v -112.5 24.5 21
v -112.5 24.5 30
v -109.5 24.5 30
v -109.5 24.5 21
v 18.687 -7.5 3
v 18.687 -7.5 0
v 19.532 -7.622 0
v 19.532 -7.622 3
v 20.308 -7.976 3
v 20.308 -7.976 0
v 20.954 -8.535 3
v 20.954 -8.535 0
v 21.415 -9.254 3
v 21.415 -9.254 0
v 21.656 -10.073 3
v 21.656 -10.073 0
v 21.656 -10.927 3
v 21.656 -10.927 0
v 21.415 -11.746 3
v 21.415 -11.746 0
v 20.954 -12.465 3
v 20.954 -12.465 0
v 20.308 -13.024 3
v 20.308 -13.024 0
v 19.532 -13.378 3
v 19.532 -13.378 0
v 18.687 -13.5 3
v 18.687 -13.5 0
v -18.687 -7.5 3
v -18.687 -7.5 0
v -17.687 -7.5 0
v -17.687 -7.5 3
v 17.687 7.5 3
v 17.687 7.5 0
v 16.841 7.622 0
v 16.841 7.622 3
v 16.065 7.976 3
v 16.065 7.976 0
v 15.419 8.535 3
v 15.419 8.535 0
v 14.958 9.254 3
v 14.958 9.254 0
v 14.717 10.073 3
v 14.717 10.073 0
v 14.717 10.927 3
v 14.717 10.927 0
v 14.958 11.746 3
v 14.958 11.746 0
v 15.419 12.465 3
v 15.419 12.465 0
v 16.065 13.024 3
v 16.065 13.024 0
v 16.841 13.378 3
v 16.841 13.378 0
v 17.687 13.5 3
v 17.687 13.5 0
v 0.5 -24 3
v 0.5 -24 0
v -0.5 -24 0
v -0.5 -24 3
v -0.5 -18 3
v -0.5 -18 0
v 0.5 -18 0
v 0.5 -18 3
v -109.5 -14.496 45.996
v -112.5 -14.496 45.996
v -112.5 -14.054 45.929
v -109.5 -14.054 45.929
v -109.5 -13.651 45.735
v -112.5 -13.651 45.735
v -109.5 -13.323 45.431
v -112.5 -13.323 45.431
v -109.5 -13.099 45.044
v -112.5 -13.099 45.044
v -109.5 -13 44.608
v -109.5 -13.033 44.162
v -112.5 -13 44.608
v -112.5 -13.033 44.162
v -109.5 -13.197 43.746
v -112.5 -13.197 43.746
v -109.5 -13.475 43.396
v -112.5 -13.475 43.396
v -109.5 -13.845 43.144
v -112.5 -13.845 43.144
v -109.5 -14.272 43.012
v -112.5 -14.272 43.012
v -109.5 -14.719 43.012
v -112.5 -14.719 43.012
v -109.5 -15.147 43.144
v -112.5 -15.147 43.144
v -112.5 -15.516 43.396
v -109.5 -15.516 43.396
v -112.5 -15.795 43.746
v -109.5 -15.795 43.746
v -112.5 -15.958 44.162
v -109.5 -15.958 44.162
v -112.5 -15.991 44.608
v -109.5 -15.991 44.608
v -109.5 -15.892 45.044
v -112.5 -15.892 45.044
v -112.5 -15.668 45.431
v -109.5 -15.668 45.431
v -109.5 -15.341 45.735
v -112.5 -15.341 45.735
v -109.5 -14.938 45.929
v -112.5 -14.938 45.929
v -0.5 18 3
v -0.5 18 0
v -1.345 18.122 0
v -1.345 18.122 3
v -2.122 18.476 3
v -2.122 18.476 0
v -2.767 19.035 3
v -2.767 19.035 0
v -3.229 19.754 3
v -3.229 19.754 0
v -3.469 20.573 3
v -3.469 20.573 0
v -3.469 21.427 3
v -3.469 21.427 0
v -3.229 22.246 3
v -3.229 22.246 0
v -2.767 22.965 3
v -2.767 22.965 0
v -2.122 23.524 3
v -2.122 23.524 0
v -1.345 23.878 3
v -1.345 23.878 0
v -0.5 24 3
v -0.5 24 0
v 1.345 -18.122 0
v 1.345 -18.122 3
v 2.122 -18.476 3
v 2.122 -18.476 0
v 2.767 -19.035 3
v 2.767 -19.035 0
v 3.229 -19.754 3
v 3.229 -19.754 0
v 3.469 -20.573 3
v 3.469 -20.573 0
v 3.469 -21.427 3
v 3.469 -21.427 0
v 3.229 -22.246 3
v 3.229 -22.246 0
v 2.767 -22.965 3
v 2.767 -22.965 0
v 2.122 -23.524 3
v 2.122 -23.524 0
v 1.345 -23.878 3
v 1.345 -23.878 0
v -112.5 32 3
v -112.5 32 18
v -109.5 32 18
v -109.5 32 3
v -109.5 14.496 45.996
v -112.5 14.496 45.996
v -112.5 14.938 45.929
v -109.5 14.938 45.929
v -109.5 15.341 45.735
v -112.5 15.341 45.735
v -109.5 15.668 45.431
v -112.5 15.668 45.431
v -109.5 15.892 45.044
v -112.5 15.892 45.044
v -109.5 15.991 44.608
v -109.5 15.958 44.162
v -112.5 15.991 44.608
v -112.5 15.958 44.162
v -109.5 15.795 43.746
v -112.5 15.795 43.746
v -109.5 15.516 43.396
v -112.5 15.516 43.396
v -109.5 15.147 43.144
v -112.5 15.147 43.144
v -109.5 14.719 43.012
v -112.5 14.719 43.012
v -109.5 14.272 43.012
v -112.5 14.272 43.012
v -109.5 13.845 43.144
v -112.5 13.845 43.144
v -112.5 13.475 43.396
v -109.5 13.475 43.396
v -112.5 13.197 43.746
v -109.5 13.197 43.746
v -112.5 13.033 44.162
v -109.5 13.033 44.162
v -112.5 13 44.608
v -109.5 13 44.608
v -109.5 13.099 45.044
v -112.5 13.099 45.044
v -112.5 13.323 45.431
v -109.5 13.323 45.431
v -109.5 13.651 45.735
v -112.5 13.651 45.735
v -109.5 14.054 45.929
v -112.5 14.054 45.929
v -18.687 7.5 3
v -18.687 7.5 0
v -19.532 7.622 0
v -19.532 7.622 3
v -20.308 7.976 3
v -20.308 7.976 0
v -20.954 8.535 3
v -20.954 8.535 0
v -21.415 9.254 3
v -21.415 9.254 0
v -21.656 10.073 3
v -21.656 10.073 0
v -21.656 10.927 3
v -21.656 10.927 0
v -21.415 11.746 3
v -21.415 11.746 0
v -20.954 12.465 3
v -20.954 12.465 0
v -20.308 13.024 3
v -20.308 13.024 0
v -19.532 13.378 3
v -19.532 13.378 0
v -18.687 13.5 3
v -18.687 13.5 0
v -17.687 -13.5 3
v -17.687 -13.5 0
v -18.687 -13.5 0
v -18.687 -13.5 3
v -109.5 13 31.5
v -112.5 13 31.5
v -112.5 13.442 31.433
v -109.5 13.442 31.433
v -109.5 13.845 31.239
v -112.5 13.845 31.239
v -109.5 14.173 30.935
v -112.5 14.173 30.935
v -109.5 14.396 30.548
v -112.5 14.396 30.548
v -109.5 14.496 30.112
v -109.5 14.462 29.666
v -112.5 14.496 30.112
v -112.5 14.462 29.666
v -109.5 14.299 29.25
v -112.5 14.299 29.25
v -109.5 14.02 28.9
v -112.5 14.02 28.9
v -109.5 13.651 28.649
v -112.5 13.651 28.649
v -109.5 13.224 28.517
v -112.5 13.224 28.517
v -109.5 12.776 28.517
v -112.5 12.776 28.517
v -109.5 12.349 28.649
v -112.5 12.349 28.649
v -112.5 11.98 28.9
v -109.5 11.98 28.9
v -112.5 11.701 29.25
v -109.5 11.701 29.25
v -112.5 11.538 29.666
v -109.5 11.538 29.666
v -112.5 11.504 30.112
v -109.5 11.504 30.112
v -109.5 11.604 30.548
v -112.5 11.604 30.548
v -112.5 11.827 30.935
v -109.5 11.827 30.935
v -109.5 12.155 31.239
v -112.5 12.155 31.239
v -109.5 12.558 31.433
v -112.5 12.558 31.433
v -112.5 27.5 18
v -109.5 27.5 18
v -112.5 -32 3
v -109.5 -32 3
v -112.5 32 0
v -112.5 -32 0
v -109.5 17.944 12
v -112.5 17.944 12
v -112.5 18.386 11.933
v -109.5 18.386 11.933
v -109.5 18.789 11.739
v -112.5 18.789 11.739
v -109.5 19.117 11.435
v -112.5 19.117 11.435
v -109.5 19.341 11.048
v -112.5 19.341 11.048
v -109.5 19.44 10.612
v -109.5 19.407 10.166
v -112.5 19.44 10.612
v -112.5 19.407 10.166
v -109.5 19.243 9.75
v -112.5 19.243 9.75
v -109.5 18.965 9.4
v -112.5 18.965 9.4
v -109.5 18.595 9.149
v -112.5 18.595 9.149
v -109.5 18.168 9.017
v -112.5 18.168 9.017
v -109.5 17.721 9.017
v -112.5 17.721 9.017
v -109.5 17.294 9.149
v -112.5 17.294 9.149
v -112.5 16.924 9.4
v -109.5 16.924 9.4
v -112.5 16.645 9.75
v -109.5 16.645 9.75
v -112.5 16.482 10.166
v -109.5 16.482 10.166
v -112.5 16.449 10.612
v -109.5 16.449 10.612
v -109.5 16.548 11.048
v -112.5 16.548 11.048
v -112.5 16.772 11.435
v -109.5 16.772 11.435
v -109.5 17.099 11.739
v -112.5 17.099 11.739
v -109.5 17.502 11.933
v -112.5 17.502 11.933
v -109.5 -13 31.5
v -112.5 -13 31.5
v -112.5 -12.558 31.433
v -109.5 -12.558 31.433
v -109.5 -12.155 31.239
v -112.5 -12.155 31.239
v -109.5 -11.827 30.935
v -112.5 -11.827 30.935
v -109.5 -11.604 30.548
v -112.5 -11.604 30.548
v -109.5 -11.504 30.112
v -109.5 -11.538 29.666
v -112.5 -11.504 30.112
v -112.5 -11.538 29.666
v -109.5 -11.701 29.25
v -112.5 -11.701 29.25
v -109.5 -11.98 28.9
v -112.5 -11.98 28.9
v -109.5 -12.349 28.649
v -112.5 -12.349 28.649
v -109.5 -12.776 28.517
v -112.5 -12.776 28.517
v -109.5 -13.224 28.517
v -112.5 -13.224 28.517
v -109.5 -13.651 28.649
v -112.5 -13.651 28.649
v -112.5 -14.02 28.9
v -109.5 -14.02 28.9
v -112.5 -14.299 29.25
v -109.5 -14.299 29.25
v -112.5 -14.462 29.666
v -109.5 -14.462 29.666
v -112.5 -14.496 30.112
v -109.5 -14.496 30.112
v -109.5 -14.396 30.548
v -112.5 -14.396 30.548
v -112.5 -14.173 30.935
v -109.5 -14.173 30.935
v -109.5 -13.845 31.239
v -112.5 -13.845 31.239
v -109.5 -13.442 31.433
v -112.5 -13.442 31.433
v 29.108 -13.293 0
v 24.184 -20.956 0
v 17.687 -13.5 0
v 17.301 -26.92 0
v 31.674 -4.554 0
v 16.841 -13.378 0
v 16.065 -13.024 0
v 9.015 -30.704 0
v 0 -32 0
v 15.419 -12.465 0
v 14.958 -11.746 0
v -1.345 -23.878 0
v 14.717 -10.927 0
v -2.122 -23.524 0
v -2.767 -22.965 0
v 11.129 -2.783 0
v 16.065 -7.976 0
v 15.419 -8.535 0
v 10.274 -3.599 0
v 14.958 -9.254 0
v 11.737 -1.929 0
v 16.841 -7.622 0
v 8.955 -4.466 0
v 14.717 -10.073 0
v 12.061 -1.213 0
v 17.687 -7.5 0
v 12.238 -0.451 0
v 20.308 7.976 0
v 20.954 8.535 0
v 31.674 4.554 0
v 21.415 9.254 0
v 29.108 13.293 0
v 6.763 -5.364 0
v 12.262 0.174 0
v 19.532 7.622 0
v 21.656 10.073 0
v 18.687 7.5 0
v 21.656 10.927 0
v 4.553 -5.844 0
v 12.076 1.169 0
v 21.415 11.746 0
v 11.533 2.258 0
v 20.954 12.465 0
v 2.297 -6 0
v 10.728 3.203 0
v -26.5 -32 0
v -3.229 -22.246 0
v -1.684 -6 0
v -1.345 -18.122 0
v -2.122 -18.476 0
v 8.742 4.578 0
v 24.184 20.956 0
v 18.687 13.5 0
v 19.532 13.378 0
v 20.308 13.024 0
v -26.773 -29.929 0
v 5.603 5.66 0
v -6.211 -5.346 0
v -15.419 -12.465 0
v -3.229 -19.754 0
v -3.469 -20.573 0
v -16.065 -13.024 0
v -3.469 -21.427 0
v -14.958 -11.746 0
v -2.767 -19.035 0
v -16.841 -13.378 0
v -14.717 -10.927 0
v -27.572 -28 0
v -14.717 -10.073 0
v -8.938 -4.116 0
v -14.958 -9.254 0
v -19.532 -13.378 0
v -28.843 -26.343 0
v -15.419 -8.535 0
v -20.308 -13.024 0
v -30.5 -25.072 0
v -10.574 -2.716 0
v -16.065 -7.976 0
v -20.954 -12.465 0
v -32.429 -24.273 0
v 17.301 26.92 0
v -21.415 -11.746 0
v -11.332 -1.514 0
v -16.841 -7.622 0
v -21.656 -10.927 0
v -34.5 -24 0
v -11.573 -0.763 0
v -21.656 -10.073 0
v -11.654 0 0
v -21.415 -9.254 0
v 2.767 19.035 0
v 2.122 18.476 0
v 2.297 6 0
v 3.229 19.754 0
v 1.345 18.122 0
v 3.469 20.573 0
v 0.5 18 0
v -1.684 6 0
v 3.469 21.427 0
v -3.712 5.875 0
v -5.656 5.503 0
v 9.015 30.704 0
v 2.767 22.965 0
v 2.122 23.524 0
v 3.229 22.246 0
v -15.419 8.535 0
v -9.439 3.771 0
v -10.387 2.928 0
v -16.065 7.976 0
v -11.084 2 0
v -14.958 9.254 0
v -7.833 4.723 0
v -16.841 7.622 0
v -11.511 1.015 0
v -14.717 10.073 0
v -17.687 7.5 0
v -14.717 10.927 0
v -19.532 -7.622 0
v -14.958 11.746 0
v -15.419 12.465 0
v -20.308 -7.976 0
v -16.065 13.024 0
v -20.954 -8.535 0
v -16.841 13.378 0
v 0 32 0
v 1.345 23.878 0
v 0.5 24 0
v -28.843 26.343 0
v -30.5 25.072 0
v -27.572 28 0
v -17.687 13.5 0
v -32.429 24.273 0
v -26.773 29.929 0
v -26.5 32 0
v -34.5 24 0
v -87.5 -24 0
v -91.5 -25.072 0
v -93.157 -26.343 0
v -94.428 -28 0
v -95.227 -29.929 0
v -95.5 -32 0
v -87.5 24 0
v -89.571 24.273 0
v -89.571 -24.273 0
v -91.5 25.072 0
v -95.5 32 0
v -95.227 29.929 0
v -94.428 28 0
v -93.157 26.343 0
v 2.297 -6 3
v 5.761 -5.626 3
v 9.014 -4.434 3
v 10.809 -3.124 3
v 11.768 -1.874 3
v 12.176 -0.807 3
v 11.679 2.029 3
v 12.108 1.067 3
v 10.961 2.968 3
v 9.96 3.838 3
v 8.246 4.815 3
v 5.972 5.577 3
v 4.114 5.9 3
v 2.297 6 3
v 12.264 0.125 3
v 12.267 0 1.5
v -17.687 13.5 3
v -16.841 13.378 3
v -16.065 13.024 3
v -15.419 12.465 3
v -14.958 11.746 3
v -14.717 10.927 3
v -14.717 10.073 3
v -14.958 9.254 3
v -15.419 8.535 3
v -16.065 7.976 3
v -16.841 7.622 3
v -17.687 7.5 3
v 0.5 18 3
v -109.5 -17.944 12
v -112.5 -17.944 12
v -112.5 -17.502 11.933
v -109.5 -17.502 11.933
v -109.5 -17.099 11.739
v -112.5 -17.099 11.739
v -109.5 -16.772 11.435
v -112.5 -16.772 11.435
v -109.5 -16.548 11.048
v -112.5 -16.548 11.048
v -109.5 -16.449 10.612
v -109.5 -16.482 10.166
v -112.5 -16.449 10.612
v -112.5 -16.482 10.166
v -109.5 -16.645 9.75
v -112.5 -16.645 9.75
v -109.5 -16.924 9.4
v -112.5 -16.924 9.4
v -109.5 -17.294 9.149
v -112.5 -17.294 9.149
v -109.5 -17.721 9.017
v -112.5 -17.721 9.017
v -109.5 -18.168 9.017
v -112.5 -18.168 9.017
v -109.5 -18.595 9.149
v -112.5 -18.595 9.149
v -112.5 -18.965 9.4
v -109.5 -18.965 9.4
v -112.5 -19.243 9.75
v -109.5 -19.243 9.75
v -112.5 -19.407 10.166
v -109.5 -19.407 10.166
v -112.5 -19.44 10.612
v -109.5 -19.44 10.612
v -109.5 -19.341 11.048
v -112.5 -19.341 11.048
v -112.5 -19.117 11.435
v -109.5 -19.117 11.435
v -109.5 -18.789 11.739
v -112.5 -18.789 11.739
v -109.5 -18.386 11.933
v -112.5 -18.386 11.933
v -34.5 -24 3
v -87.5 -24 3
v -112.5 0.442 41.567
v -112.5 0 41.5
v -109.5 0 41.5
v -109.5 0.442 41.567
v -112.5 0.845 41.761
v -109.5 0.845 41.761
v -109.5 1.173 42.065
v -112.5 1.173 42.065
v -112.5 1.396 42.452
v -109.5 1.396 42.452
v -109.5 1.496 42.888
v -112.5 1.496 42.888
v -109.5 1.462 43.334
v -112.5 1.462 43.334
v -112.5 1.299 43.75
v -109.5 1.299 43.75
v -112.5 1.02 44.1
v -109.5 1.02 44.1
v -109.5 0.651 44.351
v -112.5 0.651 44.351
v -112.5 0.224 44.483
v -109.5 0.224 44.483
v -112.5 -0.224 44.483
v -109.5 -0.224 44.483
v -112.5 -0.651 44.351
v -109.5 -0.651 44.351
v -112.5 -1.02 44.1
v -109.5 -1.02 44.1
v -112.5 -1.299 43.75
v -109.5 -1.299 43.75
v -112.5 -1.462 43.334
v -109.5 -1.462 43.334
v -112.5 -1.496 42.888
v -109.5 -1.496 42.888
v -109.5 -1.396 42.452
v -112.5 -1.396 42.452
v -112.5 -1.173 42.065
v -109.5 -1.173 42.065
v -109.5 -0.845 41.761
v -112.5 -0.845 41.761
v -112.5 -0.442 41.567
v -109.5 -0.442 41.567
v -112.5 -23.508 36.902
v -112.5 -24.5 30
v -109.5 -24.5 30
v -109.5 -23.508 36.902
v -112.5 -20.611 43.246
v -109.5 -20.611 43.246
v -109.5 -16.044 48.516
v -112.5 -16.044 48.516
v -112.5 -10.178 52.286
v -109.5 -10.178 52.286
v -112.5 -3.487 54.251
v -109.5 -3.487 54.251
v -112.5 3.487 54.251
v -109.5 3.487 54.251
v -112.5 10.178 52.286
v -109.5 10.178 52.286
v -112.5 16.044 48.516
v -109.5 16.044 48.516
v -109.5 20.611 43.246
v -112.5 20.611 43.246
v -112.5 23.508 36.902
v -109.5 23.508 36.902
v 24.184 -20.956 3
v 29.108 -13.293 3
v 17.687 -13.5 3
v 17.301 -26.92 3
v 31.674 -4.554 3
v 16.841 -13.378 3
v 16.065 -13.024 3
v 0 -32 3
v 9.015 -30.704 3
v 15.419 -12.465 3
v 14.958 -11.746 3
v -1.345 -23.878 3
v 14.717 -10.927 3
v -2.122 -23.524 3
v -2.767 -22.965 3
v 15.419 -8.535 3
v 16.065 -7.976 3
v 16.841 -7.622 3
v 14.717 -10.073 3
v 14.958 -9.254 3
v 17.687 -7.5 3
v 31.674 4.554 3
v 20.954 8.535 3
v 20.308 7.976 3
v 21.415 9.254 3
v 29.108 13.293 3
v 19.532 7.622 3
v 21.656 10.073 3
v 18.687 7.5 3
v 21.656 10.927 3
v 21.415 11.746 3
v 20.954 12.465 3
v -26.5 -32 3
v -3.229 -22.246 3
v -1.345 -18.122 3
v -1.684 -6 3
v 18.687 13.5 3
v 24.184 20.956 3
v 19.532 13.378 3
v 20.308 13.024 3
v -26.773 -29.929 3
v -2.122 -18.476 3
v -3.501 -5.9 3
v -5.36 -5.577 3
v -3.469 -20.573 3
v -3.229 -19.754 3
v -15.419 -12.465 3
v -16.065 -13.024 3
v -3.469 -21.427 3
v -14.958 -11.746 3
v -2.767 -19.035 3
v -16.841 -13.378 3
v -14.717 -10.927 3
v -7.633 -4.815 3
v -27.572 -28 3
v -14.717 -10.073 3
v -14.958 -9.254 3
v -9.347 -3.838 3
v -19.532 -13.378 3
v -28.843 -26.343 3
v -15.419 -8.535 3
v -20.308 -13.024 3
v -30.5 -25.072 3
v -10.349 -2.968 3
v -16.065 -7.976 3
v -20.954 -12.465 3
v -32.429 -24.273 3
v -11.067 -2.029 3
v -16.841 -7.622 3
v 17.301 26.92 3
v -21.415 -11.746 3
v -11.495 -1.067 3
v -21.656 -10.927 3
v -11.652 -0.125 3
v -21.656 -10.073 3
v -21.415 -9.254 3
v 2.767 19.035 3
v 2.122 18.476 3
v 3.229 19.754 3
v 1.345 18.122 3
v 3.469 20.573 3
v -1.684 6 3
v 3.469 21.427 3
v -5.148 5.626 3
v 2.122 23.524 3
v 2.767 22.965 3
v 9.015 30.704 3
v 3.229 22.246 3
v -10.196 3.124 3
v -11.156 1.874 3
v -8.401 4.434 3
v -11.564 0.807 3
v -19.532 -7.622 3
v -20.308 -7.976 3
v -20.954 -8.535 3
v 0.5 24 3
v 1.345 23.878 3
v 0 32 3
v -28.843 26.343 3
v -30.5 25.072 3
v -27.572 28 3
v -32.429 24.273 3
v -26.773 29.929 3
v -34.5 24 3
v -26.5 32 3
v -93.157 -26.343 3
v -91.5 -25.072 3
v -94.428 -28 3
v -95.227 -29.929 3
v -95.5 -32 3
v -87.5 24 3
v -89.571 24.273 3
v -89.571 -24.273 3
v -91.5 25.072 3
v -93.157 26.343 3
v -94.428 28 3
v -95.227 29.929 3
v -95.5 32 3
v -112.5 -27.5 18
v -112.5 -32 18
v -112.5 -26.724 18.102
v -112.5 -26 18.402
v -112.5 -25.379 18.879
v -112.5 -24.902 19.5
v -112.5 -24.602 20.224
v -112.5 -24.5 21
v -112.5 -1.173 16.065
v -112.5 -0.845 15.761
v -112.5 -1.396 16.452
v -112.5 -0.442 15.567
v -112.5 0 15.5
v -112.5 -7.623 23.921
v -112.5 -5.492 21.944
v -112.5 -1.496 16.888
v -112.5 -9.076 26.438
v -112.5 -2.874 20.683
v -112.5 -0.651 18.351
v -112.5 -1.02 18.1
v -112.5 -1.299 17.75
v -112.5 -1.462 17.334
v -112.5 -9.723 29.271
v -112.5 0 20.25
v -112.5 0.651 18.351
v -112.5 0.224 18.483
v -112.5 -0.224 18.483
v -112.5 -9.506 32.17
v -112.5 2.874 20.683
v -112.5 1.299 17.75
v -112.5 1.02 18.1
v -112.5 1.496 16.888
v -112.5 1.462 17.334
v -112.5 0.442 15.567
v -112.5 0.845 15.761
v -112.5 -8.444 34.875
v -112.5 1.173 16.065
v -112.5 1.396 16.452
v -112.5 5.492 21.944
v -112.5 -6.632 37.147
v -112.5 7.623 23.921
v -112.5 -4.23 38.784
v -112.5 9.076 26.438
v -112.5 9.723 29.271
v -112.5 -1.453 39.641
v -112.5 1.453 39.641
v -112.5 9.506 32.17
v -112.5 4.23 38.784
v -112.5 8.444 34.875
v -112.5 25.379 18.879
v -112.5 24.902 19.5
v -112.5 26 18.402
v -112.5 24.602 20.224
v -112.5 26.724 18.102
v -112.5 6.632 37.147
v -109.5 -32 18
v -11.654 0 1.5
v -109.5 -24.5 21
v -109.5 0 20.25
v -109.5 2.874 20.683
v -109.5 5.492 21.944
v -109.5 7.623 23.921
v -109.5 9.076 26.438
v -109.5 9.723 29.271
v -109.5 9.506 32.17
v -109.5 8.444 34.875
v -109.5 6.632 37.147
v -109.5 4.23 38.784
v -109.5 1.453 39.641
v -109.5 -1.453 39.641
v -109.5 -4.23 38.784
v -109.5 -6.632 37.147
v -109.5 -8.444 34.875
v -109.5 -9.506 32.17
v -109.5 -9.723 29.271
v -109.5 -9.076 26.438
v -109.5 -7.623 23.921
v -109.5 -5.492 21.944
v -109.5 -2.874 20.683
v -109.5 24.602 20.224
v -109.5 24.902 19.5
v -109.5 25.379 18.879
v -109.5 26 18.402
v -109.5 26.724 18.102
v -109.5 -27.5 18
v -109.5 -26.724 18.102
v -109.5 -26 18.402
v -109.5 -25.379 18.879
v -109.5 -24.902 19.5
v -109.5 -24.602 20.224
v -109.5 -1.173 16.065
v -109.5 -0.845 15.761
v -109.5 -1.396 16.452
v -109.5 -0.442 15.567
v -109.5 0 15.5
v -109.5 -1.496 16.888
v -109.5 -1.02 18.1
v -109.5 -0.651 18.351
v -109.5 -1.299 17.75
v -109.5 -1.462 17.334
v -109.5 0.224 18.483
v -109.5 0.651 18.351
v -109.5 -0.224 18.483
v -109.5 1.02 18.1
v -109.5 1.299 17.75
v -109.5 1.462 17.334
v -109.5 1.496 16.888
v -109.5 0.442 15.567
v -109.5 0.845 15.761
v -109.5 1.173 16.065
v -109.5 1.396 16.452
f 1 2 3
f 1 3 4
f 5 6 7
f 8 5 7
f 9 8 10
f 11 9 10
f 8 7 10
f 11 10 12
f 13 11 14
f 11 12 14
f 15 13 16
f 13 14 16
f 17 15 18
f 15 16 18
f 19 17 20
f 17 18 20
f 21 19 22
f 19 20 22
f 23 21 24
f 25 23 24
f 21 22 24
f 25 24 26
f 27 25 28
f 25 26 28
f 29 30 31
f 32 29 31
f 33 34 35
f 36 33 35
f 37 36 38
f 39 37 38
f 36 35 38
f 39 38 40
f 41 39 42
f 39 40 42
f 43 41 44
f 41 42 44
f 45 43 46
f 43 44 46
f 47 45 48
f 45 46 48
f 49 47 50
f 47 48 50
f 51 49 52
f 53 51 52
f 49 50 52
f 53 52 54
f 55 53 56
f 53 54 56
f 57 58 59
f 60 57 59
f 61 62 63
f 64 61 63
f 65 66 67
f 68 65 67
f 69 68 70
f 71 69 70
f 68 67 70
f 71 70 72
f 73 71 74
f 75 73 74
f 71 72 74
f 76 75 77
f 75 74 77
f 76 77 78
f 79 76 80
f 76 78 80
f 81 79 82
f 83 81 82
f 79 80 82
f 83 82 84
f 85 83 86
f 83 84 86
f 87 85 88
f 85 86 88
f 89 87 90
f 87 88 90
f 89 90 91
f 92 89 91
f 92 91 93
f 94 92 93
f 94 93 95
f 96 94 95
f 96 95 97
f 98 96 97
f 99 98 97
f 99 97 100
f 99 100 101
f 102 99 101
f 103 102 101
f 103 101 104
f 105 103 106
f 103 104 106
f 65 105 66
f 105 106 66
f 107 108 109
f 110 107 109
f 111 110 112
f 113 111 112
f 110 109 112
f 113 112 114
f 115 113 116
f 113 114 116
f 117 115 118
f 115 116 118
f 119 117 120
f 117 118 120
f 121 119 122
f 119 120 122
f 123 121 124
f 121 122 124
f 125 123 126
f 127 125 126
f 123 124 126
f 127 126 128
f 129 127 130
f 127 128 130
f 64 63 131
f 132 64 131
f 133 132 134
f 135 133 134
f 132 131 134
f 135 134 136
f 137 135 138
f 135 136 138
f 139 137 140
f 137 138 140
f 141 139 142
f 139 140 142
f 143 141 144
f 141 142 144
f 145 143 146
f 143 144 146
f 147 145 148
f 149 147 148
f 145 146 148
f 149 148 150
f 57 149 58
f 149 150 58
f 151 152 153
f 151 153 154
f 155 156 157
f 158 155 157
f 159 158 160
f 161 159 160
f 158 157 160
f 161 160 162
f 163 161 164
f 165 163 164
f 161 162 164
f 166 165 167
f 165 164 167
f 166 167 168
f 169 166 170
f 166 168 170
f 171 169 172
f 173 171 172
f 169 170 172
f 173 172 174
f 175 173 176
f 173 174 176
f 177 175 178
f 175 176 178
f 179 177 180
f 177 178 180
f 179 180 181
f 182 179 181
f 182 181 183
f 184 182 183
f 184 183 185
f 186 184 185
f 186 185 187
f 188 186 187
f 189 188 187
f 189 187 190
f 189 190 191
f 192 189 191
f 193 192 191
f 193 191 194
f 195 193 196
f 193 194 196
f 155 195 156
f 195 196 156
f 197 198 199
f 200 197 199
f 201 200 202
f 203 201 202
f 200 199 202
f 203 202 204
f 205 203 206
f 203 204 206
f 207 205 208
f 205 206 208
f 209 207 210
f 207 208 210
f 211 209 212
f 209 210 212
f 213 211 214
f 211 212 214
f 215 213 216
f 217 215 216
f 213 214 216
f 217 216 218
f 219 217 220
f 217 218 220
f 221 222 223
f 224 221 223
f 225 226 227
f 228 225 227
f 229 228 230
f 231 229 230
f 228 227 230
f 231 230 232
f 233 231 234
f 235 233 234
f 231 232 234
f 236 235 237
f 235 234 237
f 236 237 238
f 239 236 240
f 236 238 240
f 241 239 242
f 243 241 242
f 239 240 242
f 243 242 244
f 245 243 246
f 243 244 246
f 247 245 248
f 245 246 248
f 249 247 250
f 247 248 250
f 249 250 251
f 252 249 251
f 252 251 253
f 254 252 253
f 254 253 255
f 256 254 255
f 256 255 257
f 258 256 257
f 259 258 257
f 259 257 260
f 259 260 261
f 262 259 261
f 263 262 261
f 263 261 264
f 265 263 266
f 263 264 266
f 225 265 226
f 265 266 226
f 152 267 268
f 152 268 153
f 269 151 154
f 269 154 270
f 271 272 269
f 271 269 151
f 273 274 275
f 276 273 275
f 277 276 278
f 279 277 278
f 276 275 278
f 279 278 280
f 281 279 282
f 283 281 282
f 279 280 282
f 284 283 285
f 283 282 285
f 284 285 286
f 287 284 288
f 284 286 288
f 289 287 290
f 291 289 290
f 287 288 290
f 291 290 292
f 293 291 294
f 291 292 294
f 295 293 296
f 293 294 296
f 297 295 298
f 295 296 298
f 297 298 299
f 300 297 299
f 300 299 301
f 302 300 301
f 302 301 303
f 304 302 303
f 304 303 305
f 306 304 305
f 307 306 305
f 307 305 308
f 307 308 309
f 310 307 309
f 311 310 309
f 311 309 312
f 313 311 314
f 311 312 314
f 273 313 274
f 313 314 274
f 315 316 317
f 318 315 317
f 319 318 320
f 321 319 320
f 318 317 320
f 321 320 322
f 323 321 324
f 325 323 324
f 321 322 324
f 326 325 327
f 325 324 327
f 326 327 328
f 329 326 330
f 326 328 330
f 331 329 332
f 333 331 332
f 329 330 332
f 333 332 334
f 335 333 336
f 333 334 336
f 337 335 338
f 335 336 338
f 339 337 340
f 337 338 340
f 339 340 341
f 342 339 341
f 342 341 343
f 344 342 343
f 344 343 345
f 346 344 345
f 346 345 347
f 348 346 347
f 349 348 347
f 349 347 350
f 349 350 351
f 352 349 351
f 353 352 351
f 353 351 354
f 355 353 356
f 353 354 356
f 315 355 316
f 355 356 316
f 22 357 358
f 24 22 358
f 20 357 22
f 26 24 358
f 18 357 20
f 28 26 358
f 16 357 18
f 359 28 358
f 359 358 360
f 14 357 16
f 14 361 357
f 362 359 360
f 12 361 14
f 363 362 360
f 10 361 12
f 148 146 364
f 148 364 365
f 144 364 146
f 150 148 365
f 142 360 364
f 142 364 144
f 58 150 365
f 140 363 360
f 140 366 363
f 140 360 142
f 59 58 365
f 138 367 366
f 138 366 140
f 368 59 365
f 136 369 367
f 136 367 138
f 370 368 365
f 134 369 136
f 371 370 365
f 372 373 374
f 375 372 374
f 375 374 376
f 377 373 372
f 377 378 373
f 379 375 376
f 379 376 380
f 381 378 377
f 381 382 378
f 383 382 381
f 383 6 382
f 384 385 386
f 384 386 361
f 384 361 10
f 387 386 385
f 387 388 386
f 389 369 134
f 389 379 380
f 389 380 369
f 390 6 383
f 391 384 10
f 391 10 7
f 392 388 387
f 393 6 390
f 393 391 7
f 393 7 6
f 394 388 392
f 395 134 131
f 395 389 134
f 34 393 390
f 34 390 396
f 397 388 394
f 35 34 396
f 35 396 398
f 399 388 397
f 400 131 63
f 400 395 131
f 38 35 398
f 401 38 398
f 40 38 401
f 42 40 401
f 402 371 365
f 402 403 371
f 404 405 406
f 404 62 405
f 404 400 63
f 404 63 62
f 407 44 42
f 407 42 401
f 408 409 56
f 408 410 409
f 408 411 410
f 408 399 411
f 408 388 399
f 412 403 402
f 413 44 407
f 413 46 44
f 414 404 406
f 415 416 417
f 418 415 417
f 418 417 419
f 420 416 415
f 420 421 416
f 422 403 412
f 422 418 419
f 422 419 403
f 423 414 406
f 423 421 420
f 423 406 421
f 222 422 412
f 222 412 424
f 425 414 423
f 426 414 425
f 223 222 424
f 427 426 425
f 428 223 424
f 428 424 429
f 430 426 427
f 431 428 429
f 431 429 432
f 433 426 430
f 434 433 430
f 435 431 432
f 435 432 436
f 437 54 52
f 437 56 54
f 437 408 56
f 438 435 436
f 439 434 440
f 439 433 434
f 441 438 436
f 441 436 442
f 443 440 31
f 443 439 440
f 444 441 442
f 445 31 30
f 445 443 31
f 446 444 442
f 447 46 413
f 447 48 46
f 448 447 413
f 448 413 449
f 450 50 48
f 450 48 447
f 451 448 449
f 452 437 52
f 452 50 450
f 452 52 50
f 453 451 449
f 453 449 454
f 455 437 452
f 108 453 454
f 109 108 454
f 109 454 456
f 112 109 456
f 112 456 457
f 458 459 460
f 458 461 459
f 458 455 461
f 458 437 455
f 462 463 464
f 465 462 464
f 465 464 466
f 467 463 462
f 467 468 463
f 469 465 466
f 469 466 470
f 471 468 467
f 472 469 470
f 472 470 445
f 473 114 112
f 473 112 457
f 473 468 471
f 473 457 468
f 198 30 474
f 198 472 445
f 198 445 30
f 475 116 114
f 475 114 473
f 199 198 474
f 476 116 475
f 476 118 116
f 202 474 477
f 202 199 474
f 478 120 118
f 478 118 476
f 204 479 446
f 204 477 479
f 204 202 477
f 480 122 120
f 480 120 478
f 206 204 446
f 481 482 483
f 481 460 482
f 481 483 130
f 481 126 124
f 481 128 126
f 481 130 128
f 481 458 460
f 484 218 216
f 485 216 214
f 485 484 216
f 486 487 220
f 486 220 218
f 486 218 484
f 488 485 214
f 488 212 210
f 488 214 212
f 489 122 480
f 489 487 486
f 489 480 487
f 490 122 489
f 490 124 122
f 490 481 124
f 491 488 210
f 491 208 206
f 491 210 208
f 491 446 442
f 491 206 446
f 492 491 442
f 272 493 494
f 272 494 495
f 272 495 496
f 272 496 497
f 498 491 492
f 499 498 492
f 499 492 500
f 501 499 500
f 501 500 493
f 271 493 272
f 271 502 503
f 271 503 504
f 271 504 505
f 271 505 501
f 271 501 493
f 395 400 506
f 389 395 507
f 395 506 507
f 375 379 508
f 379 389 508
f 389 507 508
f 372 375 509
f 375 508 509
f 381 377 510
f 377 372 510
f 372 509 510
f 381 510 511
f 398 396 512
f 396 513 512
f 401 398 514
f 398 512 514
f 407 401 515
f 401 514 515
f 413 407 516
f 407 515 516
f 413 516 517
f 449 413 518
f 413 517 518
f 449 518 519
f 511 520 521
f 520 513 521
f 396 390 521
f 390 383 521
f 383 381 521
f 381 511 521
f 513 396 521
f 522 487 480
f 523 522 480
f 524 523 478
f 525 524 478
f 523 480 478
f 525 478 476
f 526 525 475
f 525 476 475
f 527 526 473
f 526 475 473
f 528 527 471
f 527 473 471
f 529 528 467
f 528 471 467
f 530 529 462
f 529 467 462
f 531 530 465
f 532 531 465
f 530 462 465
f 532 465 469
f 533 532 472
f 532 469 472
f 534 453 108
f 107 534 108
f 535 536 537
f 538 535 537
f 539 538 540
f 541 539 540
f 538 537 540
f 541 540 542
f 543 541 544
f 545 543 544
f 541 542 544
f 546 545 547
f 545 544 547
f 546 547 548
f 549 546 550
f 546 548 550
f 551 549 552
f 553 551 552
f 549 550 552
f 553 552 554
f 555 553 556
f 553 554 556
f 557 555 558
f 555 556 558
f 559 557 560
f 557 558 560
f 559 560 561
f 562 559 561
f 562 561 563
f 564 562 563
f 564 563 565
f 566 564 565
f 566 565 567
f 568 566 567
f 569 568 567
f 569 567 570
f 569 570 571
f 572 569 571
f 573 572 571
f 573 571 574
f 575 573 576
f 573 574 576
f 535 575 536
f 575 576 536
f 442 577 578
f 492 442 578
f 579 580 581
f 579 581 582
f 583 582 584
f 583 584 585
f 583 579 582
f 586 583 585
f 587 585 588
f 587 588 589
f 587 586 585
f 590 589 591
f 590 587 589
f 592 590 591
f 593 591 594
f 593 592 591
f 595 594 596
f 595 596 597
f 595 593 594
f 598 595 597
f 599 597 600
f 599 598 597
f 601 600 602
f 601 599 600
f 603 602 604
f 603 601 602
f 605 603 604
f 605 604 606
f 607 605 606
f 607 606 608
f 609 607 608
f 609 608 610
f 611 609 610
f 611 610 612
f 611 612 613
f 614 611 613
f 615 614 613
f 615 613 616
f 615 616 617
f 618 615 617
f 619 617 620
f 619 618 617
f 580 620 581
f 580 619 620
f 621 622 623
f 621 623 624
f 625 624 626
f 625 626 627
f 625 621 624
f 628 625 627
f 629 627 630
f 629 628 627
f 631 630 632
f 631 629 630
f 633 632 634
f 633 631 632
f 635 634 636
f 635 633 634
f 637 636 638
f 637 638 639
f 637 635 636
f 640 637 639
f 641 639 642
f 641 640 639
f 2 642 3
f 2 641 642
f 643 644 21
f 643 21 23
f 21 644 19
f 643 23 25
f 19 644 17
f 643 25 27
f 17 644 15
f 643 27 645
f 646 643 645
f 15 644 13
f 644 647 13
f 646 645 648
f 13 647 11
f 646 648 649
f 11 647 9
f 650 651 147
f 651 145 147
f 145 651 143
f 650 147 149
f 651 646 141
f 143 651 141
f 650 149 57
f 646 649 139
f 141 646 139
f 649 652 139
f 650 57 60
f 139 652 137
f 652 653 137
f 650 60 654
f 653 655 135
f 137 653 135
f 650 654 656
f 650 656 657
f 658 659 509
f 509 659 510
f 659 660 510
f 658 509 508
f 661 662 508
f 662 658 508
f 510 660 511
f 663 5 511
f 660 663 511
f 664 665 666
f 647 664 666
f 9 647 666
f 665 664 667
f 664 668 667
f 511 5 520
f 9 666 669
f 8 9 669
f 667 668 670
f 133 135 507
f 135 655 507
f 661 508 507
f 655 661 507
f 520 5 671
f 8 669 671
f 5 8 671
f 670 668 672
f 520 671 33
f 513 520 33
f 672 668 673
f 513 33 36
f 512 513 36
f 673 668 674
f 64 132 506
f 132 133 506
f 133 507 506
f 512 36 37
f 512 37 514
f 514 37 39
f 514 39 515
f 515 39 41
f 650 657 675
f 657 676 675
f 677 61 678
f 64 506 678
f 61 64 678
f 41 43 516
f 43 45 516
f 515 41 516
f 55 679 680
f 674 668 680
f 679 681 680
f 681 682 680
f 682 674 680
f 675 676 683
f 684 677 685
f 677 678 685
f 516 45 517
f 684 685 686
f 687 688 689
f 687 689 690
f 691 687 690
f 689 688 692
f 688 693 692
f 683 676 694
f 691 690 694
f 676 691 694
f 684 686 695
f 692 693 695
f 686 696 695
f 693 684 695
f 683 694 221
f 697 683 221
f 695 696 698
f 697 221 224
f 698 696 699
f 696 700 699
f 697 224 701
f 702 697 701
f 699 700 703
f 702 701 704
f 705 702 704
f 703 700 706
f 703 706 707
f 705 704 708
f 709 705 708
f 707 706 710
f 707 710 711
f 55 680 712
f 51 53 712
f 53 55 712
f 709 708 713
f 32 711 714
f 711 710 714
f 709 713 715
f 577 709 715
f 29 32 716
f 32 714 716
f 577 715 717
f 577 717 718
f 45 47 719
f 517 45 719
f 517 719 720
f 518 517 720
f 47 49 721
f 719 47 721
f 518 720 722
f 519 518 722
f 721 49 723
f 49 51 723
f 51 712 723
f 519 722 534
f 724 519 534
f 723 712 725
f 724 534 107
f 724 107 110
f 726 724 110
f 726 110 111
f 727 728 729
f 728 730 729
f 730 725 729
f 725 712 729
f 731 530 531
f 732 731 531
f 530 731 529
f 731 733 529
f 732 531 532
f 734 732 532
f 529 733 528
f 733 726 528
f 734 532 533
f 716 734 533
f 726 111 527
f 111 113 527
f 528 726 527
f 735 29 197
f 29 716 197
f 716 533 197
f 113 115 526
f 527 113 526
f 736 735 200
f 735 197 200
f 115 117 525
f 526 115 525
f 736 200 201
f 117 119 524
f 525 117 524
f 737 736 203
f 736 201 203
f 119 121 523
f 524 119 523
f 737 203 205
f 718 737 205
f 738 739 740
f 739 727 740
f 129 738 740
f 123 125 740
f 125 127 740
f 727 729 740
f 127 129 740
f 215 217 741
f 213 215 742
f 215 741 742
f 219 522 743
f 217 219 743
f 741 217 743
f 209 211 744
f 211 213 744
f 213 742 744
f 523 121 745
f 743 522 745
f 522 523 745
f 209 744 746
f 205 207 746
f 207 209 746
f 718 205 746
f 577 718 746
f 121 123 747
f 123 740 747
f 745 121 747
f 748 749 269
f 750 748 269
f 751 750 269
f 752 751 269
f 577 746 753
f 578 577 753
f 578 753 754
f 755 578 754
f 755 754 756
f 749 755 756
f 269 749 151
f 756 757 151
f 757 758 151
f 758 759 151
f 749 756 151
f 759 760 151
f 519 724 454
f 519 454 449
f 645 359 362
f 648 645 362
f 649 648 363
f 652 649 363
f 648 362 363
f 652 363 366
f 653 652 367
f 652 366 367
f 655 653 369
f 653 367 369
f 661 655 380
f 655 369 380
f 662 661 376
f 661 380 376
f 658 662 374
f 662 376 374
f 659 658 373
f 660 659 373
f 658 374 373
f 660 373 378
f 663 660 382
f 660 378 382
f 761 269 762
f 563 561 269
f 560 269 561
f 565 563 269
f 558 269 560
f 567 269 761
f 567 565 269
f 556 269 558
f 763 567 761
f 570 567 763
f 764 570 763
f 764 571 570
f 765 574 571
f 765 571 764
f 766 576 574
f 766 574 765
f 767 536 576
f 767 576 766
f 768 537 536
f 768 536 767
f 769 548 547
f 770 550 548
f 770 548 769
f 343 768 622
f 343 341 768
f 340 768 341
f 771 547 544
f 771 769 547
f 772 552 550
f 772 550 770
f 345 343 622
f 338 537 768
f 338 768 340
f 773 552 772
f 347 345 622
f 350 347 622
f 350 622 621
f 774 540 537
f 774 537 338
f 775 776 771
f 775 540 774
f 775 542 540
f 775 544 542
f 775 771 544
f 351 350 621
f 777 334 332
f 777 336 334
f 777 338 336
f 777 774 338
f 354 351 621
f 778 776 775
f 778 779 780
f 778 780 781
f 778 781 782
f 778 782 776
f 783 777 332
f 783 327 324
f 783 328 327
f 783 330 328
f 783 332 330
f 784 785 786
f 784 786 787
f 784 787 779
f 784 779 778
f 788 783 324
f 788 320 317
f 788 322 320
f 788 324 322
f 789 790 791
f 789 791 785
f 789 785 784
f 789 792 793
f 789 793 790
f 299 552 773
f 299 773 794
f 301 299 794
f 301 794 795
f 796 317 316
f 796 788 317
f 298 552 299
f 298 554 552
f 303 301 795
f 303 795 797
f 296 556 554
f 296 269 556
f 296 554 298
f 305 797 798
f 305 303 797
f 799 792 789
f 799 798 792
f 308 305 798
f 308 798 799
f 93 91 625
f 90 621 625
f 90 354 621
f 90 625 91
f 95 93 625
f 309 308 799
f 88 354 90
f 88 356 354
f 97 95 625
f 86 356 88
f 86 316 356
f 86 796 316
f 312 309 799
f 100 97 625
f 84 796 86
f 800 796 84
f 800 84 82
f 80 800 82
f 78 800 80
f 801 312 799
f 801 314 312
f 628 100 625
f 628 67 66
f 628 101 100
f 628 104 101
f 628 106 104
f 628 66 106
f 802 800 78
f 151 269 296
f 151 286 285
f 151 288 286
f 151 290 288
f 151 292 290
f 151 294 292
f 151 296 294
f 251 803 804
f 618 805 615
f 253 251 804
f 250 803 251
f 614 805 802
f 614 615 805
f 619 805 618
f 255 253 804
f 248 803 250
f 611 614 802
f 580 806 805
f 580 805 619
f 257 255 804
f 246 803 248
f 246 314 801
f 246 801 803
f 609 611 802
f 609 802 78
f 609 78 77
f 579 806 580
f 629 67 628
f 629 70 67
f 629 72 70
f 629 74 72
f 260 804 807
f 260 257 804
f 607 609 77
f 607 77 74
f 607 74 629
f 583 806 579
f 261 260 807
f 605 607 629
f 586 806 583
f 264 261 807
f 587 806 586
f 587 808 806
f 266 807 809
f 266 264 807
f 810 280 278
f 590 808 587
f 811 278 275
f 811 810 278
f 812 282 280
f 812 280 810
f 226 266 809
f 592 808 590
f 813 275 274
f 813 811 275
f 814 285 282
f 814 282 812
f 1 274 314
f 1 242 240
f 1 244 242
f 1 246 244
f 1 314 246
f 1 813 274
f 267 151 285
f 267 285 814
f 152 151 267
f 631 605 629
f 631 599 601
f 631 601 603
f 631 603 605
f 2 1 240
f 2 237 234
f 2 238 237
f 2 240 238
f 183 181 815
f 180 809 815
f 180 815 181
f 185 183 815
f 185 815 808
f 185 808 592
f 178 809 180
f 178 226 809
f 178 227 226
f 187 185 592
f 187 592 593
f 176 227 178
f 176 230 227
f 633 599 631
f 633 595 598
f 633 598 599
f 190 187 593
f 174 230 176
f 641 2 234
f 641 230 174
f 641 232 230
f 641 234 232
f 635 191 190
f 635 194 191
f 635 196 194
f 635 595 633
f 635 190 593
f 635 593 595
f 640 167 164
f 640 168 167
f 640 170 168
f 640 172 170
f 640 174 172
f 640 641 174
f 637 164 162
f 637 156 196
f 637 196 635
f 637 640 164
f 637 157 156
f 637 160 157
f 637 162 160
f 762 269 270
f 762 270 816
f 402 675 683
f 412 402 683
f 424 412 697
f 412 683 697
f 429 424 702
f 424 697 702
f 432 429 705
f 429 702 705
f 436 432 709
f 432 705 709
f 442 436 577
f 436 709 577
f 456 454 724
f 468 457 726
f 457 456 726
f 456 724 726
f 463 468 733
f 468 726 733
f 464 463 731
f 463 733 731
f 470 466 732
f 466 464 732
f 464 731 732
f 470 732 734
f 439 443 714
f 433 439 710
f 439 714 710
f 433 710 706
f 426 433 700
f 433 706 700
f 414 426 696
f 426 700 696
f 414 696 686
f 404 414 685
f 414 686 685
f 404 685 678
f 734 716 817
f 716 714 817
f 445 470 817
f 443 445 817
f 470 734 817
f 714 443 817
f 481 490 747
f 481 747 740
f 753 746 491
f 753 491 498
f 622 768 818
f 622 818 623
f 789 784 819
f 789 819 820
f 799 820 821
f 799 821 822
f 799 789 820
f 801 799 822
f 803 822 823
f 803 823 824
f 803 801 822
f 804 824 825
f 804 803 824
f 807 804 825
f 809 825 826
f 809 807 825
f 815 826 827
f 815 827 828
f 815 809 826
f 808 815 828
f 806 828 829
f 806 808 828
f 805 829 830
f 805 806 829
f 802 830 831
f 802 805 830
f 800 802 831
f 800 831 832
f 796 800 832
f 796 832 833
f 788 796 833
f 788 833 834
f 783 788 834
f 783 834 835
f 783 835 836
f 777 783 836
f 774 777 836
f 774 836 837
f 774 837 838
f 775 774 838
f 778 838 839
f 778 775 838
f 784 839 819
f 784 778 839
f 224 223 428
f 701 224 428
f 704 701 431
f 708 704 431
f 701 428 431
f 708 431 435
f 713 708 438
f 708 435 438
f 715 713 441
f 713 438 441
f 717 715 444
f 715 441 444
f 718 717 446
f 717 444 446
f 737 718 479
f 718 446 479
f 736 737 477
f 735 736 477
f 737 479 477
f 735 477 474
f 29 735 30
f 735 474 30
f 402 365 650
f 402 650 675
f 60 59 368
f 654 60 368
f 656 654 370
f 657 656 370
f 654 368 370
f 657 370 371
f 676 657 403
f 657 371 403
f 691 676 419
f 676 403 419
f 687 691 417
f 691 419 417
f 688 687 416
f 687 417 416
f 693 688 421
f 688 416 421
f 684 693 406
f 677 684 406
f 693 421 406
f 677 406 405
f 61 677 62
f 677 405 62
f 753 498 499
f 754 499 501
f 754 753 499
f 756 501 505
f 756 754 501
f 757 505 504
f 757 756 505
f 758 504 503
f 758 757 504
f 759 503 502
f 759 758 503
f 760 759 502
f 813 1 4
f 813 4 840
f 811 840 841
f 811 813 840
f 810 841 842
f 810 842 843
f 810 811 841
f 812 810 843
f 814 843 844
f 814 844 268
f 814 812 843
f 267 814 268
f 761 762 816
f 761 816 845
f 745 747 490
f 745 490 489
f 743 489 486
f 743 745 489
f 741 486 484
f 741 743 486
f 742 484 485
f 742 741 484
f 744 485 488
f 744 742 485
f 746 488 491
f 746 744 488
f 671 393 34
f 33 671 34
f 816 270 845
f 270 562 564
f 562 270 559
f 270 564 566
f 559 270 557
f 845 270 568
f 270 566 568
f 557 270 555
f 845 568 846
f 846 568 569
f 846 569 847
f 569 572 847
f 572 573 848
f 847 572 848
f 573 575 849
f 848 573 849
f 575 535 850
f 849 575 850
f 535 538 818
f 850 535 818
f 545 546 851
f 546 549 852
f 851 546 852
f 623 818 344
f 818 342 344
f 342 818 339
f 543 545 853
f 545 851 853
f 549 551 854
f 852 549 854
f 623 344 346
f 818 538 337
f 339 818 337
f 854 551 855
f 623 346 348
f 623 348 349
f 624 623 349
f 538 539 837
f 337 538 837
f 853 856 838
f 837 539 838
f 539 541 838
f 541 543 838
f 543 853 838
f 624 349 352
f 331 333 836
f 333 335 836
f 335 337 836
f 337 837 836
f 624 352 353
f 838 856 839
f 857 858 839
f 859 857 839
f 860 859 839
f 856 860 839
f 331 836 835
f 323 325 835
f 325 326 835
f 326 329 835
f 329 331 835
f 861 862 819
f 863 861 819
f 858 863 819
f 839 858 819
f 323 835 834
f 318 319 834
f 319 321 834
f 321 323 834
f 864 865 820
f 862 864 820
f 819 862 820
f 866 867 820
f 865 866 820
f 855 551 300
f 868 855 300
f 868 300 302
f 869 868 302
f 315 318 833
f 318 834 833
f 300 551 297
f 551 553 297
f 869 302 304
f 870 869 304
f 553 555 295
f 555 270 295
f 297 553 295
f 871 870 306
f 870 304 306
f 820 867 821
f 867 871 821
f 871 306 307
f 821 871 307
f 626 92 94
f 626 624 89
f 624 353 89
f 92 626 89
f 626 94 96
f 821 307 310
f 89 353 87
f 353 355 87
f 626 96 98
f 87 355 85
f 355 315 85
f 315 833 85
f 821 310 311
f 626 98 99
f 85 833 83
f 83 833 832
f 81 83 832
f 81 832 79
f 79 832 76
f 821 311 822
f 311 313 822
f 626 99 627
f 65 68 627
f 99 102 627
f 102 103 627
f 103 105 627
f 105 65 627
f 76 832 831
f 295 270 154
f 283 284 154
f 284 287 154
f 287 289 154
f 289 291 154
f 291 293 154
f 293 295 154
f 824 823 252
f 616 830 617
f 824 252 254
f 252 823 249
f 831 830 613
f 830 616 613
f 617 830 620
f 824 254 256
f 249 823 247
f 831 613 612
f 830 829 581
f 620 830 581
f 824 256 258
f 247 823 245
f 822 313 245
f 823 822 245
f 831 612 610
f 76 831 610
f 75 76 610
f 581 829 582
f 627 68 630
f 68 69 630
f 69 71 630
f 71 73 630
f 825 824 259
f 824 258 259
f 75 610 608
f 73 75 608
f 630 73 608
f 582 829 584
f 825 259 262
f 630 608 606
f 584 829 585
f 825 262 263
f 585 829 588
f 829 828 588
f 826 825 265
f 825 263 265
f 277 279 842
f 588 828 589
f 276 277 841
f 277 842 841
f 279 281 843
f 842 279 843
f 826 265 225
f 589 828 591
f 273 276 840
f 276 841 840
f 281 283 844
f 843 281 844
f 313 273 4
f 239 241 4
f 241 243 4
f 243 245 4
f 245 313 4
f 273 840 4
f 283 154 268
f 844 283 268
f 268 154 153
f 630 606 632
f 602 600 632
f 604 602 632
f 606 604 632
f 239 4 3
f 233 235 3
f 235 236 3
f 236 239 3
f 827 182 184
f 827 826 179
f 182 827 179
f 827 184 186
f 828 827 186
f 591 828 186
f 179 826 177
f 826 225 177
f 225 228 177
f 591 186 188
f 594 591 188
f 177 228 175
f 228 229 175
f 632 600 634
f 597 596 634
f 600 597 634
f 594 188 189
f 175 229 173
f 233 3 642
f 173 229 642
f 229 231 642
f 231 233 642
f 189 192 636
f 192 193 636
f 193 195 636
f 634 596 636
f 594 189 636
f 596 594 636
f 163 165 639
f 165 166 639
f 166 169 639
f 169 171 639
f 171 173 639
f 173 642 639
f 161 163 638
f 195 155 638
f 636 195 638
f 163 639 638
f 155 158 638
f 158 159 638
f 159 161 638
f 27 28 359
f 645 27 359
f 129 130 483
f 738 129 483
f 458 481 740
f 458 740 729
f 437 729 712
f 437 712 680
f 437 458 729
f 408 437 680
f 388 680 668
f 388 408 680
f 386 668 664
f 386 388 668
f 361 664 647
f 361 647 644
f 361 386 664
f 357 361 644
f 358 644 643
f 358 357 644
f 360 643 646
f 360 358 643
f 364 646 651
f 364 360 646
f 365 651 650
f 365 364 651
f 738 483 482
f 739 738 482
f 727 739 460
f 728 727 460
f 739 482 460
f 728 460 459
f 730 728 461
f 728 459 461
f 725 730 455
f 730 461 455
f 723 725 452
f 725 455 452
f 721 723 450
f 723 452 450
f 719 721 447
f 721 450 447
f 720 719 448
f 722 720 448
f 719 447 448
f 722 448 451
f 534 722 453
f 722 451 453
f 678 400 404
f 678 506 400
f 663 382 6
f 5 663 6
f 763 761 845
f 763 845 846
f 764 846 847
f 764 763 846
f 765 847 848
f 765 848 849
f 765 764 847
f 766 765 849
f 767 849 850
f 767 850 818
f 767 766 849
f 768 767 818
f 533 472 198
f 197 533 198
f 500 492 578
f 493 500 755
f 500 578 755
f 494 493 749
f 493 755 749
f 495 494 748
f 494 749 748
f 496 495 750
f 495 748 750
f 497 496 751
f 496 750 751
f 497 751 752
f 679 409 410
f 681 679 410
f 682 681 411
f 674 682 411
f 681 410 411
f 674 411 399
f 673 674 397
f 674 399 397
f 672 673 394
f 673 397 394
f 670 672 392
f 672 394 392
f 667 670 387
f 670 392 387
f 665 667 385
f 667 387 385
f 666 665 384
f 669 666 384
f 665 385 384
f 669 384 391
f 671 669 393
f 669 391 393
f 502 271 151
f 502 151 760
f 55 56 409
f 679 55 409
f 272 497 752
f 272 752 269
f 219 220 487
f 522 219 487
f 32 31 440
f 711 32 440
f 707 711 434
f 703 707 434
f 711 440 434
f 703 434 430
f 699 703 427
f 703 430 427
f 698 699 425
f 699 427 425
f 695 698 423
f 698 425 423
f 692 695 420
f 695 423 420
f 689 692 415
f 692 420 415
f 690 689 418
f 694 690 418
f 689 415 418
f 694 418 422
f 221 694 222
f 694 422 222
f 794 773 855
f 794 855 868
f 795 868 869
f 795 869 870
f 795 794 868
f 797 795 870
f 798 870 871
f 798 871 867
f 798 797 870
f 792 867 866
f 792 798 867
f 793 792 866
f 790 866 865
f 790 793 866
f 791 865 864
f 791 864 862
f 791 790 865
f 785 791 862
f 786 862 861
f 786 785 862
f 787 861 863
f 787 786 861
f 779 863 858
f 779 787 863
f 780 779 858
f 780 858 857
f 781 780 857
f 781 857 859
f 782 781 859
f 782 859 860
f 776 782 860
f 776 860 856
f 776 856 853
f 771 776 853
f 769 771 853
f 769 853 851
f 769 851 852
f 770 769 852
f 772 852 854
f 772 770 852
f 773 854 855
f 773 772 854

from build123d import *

# Parameters (mm, degrees)
BOSS_EXTRUDE1_DEPTH = 3
SKETCH2_R           = 1.5
BOSS_EXTRUDE2_DEPTH = 3
SKETCH3_R           = 6
CUT_EXTRUDE1_DEPTH  = 150.495916109
CUT_EXTRUDE2_DEPTH  = 128.79866979
CUT_EXTRUDE3_DEPTH  = 128.798669903


with BuildPart() as part:
    # Sketch1 → Boss-Extrude1 (new body)
    with BuildSketch(Plane.XY):
        with BuildLine():
            Line((-112.5, 32), (0, 32))
            ThreePointArc((0, 32), (32, 0), (0, -32))
            Line((0, -32), (-112.5, -32))
            Line((-112.5, -32), (-112.5, 32))
        make_face()
        with BuildLine():
            Line((17.686533479, 13.5), (18.686533479, 13.5))
            ThreePointArc((18.686533479, 13.5), (21.686533479, 10.5), (18.686533479, 7.5))
            Line((18.686533479, 7.5), (17.686533479, 7.5))
            ThreePointArc((17.686533479, 7.5), (14.686533479, 10.5), (17.686533479, 13.5))
        make_face(mode=Mode.SUBTRACT)
        with BuildLine():
            Line((17.686533479, -7.5), (18.686533479, -7.5))
            ThreePointArc((18.686533479, -7.5), (21.686533479, -10.5), (18.686533479, -13.5))
            Line((18.686533479, -13.5), (17.686533479, -13.5))
            ThreePointArc((17.686533479, -13.5), (14.686533479, -10.5), (17.686533479, -7.5))
        make_face(mode=Mode.SUBTRACT)
        with BuildLine():
            Line((-0.5, -18), (0.5, -18))
            ThreePointArc((0.5, -18), (3.5, -21), (0.5, -24))
            Line((0.5, -24), (-0.5, -24))
            ThreePointArc((-0.5, -24), (-3.5, -21), (-0.5, -18))
        make_face(mode=Mode.SUBTRACT)
        with BuildLine():
            Line((-18.686533479, -7.5), (-17.686533479, -7.5))
            ThreePointArc((-17.686533479, -7.5), (-14.686533479, -10.5), (-17.686533479, -13.5))
            Line((-17.686533479, -13.5), (-18.686533479, -13.5))
            ThreePointArc((-18.686533479, -13.5), (-21.686533479, -10.5), (-18.686533479, -7.5))
        make_face(mode=Mode.SUBTRACT)
        with BuildLine():
            Line((-17.686533479, 7.5), (-18.686533479, 7.5))
            ThreePointArc((-18.686533479, 7.5), (-21.686533479, 10.5), (-18.686533479, 13.5))
            Line((-18.686533479, 13.5), (-17.686533479, 13.5))
            ThreePointArc((-17.686533479, 13.5), (-14.686533479, 10.5), (-17.686533479, 7.5))
        make_face(mode=Mode.SUBTRACT)
        with BuildLine():
            Line((0.5, 18), (-0.5, 18))
            ThreePointArc((-0.5, 18), (-3.5, 21), (-0.5, 24))
            Line((-0.5, 24), (0.5, 24))
            ThreePointArc((0.5, 24), (3.5, 21), (0.5, 18))
        make_face(mode=Mode.SUBTRACT)
    extrude(amount=BOSS_EXTRUDE1_DEPTH)

    # Sketch3 → Cut-Extrude1 (cut, through all)
    with BuildSketch(Plane(origin=(-68.399252687, 0, -51.542533886), x_dir=(0, 1, 0), z_dir=(0.798635510047294, 0, 0.6018150231520466))):
        with Locations(Location((0, 1.0136449, 0), (0, 0, 90))):
            Circle(SKETCH3_R)
    extrude(amount=CUT_EXTRUDE1_DEPTH, mode=Mode.SUBTRACT)

    # Sketch4 → Cut-Extrude2 (cut, through all)
    with BuildSketch(Plane.XY.offset(3)):
        with BuildLine():
            Line((2.296821411, -6), (-1.684313054, -6))
            add(Edge.make_bspline(
                [(-1.684313054, 6), (-11.654153901, 6), (-11.654153901, 0), (-11.654153901, -6), (-1.684313054, -6)],
                knots=[4.71238898, 4.71238898, 4.71238898, 6.283185307, 6.283185307, 7.853981634, 7.853981634, 7.853981634], degree=2, weights=[1, 0.707106781, 1, 0.707106781, 1]))
            Line((-1.684313054, 6), (2.296821411, 6))
            add(Edge.make_bspline(
                [(2.296821411, -6), (12.266662258, -6), (12.266662258, 0), (12.266662258, 6), (2.296821411, 6)],
                knots=[4.71238898, 4.71238898, 4.71238898, 6.283185307, 6.283185307, 7.853981634, 7.853981634, 7.853981634], degree=2, weights=[1, 0.707106781, 1, 0.707106781, 1]))
        make_face()
    extrude(amount=-CUT_EXTRUDE2_DEPTH, mode=Mode.SUBTRACT)

    # Sketch5 → Cut-Extrude3 (cut, through all)
    with BuildSketch(Plane.XY.offset(3)):
        with BuildLine():
            Line((-34.5, 24), (-87.5, 24))
            ThreePointArc((-87.5, 24), (-95.5, 32), (-87.5, 40))
            Line((-87.5, 40), (-34.5, 40))
            ThreePointArc((-34.5, 40), (-26.5, 32), (-34.5, 24))
        make_face()
        with BuildLine():
            Line((-34.5, -24), (-87.5, -24))
            ThreePointArc((-87.5, -24), (-95.5, -32), (-87.5, -40))
            Line((-87.5, -40), (-34.5, -40))
            ThreePointArc((-34.5, -40), (-26.5, -32), (-34.5, -24))
        make_face()
    extrude(amount=-CUT_EXTRUDE3_DEPTH, mode=Mode.SUBTRACT)


with BuildPart() as body_2:
    # Sketch2 → Boss-Extrude2 (new body)
    # profile 1 of 2: a face of its own
    with BuildSketch(Plane.ZY.offset(112.5)):
        with BuildLine():
            Line((3, 0), (3, -32))
            Line((3, -32), (18, -32))
            Line((18, -32), (18, -27.5))
            ThreePointArc((18, -27.5), (18.878679656, -25.378679656), (21, -24.5))
            Line((21, -24.5), (30, -24.5))
            ThreePointArc((30, -24.5), (54.5, 0), (30, 24.5))
            Line((30, 24.5), (21, 24.5))
            ThreePointArc((21, 24.5), (18.878679656, 25.378679656), (18, 27.5))
            Line((18, 27.5), (18, 32))
            Line((18, 32), (3, 32))
            Line((3, 32), (3, 0))
        make_face()
        with Locations((10.5, -17.944358445)):
            Circle(SKETCH2_R, mode=Mode.SUBTRACT)
        with BuildLine():
            ThreePointArc((18.5, 0), (17, -1.5), (15.5, 0))
            ThreePointArc((15.5, 0), (17, 1.5), (18.5, 0))
        make_face(mode=Mode.SUBTRACT)
        with Locations((30, -13)):
            Circle(SKETCH2_R, mode=Mode.SUBTRACT)
        with Locations((44.495689014, -14.495689014)):
            Circle(SKETCH2_R, mode=Mode.SUBTRACT)
        with Locations((10.5, 17.944358445)):
            Circle(SKETCH2_R, mode=Mode.SUBTRACT)
        with BuildLine():
            ThreePointArc((39.75, 0), (30, -9.75), (20.25, 0))
            ThreePointArc((20.25, 0), (30, 9.75), (39.75, 0))
        make_face(mode=Mode.SUBTRACT)
        with Locations((30, 13)):
            Circle(SKETCH2_R, mode=Mode.SUBTRACT)
        with BuildLine():
            ThreePointArc((44.5, 0), (43, -1.5), (41.5, 0))
            ThreePointArc((41.5, 0), (43, 1.5), (44.5, 0))
        make_face(mode=Mode.SUBTRACT)
        with Locations((44.495689014, 14.495689014)):
            Circle(SKETCH2_R, mode=Mode.SUBTRACT)
    # profile 2 of 2: a face of its own
    with BuildSketch(Plane.ZY.offset(112.5)):
        with BuildLine():
            Line((3, 0), (3, -32))
            Line((3, -32), (18, -32))
            Line((18, -32), (18, -27.5))
            ThreePointArc((18, -27.5), (18.878679656, -25.378679656), (21, -24.5))
            Line((21, -24.5), (30, -24.5))
            ThreePointArc((30, -24.5), (54.5, 0), (30, 24.5))
            Line((30, 24.5), (21, 24.5))
            ThreePointArc((21, 24.5), (18.878679656, 25.378679656), (18, 27.5))
            Line((18, 27.5), (18, 32))
            Line((18, 32), (3, 32))
            Line((3, 32), (3, 0))
        make_face()
        with Locations((10.5, -17.944358445)):
            Circle(SKETCH2_R, mode=Mode.SUBTRACT)
        with BuildLine():
            ThreePointArc((18.5, 0), (17, -1.5), (15.5, 0))
            ThreePointArc((15.5, 0), (17, 1.5), (18.5, 0))
        make_face(mode=Mode.SUBTRACT)
        with Locations((30, -13)):
            Circle(SKETCH2_R, mode=Mode.SUBTRACT)
        with Locations((44.495689014, -14.495689014)):
            Circle(SKETCH2_R, mode=Mode.SUBTRACT)
        with Locations((10.5, 17.944358445)):
            Circle(SKETCH2_R, mode=Mode.SUBTRACT)
        with BuildLine():
            ThreePointArc((39.75, 0), (30, -9.75), (20.25, 0))
            ThreePointArc((20.25, 0), (30, 9.75), (39.75, 0))
        make_face(mode=Mode.SUBTRACT)
        with Locations((30, 13)):
            Circle(SKETCH2_R, mode=Mode.SUBTRACT)
        with BuildLine():
            ThreePointArc((44.5, 0), (43, -1.5), (41.5, 0))
            ThreePointArc((41.5, 0), (43, 1.5), (44.5, 0))
        make_face(mode=Mode.SUBTRACT)
        with Locations((44.495689014, 14.495689014)):
            Circle(SKETCH2_R, mode=Mode.SUBTRACT)
    extrude(amount=-BOSS_EXTRUDE2_DEPTH)


solid = Compound([part.part, body_2.part])
